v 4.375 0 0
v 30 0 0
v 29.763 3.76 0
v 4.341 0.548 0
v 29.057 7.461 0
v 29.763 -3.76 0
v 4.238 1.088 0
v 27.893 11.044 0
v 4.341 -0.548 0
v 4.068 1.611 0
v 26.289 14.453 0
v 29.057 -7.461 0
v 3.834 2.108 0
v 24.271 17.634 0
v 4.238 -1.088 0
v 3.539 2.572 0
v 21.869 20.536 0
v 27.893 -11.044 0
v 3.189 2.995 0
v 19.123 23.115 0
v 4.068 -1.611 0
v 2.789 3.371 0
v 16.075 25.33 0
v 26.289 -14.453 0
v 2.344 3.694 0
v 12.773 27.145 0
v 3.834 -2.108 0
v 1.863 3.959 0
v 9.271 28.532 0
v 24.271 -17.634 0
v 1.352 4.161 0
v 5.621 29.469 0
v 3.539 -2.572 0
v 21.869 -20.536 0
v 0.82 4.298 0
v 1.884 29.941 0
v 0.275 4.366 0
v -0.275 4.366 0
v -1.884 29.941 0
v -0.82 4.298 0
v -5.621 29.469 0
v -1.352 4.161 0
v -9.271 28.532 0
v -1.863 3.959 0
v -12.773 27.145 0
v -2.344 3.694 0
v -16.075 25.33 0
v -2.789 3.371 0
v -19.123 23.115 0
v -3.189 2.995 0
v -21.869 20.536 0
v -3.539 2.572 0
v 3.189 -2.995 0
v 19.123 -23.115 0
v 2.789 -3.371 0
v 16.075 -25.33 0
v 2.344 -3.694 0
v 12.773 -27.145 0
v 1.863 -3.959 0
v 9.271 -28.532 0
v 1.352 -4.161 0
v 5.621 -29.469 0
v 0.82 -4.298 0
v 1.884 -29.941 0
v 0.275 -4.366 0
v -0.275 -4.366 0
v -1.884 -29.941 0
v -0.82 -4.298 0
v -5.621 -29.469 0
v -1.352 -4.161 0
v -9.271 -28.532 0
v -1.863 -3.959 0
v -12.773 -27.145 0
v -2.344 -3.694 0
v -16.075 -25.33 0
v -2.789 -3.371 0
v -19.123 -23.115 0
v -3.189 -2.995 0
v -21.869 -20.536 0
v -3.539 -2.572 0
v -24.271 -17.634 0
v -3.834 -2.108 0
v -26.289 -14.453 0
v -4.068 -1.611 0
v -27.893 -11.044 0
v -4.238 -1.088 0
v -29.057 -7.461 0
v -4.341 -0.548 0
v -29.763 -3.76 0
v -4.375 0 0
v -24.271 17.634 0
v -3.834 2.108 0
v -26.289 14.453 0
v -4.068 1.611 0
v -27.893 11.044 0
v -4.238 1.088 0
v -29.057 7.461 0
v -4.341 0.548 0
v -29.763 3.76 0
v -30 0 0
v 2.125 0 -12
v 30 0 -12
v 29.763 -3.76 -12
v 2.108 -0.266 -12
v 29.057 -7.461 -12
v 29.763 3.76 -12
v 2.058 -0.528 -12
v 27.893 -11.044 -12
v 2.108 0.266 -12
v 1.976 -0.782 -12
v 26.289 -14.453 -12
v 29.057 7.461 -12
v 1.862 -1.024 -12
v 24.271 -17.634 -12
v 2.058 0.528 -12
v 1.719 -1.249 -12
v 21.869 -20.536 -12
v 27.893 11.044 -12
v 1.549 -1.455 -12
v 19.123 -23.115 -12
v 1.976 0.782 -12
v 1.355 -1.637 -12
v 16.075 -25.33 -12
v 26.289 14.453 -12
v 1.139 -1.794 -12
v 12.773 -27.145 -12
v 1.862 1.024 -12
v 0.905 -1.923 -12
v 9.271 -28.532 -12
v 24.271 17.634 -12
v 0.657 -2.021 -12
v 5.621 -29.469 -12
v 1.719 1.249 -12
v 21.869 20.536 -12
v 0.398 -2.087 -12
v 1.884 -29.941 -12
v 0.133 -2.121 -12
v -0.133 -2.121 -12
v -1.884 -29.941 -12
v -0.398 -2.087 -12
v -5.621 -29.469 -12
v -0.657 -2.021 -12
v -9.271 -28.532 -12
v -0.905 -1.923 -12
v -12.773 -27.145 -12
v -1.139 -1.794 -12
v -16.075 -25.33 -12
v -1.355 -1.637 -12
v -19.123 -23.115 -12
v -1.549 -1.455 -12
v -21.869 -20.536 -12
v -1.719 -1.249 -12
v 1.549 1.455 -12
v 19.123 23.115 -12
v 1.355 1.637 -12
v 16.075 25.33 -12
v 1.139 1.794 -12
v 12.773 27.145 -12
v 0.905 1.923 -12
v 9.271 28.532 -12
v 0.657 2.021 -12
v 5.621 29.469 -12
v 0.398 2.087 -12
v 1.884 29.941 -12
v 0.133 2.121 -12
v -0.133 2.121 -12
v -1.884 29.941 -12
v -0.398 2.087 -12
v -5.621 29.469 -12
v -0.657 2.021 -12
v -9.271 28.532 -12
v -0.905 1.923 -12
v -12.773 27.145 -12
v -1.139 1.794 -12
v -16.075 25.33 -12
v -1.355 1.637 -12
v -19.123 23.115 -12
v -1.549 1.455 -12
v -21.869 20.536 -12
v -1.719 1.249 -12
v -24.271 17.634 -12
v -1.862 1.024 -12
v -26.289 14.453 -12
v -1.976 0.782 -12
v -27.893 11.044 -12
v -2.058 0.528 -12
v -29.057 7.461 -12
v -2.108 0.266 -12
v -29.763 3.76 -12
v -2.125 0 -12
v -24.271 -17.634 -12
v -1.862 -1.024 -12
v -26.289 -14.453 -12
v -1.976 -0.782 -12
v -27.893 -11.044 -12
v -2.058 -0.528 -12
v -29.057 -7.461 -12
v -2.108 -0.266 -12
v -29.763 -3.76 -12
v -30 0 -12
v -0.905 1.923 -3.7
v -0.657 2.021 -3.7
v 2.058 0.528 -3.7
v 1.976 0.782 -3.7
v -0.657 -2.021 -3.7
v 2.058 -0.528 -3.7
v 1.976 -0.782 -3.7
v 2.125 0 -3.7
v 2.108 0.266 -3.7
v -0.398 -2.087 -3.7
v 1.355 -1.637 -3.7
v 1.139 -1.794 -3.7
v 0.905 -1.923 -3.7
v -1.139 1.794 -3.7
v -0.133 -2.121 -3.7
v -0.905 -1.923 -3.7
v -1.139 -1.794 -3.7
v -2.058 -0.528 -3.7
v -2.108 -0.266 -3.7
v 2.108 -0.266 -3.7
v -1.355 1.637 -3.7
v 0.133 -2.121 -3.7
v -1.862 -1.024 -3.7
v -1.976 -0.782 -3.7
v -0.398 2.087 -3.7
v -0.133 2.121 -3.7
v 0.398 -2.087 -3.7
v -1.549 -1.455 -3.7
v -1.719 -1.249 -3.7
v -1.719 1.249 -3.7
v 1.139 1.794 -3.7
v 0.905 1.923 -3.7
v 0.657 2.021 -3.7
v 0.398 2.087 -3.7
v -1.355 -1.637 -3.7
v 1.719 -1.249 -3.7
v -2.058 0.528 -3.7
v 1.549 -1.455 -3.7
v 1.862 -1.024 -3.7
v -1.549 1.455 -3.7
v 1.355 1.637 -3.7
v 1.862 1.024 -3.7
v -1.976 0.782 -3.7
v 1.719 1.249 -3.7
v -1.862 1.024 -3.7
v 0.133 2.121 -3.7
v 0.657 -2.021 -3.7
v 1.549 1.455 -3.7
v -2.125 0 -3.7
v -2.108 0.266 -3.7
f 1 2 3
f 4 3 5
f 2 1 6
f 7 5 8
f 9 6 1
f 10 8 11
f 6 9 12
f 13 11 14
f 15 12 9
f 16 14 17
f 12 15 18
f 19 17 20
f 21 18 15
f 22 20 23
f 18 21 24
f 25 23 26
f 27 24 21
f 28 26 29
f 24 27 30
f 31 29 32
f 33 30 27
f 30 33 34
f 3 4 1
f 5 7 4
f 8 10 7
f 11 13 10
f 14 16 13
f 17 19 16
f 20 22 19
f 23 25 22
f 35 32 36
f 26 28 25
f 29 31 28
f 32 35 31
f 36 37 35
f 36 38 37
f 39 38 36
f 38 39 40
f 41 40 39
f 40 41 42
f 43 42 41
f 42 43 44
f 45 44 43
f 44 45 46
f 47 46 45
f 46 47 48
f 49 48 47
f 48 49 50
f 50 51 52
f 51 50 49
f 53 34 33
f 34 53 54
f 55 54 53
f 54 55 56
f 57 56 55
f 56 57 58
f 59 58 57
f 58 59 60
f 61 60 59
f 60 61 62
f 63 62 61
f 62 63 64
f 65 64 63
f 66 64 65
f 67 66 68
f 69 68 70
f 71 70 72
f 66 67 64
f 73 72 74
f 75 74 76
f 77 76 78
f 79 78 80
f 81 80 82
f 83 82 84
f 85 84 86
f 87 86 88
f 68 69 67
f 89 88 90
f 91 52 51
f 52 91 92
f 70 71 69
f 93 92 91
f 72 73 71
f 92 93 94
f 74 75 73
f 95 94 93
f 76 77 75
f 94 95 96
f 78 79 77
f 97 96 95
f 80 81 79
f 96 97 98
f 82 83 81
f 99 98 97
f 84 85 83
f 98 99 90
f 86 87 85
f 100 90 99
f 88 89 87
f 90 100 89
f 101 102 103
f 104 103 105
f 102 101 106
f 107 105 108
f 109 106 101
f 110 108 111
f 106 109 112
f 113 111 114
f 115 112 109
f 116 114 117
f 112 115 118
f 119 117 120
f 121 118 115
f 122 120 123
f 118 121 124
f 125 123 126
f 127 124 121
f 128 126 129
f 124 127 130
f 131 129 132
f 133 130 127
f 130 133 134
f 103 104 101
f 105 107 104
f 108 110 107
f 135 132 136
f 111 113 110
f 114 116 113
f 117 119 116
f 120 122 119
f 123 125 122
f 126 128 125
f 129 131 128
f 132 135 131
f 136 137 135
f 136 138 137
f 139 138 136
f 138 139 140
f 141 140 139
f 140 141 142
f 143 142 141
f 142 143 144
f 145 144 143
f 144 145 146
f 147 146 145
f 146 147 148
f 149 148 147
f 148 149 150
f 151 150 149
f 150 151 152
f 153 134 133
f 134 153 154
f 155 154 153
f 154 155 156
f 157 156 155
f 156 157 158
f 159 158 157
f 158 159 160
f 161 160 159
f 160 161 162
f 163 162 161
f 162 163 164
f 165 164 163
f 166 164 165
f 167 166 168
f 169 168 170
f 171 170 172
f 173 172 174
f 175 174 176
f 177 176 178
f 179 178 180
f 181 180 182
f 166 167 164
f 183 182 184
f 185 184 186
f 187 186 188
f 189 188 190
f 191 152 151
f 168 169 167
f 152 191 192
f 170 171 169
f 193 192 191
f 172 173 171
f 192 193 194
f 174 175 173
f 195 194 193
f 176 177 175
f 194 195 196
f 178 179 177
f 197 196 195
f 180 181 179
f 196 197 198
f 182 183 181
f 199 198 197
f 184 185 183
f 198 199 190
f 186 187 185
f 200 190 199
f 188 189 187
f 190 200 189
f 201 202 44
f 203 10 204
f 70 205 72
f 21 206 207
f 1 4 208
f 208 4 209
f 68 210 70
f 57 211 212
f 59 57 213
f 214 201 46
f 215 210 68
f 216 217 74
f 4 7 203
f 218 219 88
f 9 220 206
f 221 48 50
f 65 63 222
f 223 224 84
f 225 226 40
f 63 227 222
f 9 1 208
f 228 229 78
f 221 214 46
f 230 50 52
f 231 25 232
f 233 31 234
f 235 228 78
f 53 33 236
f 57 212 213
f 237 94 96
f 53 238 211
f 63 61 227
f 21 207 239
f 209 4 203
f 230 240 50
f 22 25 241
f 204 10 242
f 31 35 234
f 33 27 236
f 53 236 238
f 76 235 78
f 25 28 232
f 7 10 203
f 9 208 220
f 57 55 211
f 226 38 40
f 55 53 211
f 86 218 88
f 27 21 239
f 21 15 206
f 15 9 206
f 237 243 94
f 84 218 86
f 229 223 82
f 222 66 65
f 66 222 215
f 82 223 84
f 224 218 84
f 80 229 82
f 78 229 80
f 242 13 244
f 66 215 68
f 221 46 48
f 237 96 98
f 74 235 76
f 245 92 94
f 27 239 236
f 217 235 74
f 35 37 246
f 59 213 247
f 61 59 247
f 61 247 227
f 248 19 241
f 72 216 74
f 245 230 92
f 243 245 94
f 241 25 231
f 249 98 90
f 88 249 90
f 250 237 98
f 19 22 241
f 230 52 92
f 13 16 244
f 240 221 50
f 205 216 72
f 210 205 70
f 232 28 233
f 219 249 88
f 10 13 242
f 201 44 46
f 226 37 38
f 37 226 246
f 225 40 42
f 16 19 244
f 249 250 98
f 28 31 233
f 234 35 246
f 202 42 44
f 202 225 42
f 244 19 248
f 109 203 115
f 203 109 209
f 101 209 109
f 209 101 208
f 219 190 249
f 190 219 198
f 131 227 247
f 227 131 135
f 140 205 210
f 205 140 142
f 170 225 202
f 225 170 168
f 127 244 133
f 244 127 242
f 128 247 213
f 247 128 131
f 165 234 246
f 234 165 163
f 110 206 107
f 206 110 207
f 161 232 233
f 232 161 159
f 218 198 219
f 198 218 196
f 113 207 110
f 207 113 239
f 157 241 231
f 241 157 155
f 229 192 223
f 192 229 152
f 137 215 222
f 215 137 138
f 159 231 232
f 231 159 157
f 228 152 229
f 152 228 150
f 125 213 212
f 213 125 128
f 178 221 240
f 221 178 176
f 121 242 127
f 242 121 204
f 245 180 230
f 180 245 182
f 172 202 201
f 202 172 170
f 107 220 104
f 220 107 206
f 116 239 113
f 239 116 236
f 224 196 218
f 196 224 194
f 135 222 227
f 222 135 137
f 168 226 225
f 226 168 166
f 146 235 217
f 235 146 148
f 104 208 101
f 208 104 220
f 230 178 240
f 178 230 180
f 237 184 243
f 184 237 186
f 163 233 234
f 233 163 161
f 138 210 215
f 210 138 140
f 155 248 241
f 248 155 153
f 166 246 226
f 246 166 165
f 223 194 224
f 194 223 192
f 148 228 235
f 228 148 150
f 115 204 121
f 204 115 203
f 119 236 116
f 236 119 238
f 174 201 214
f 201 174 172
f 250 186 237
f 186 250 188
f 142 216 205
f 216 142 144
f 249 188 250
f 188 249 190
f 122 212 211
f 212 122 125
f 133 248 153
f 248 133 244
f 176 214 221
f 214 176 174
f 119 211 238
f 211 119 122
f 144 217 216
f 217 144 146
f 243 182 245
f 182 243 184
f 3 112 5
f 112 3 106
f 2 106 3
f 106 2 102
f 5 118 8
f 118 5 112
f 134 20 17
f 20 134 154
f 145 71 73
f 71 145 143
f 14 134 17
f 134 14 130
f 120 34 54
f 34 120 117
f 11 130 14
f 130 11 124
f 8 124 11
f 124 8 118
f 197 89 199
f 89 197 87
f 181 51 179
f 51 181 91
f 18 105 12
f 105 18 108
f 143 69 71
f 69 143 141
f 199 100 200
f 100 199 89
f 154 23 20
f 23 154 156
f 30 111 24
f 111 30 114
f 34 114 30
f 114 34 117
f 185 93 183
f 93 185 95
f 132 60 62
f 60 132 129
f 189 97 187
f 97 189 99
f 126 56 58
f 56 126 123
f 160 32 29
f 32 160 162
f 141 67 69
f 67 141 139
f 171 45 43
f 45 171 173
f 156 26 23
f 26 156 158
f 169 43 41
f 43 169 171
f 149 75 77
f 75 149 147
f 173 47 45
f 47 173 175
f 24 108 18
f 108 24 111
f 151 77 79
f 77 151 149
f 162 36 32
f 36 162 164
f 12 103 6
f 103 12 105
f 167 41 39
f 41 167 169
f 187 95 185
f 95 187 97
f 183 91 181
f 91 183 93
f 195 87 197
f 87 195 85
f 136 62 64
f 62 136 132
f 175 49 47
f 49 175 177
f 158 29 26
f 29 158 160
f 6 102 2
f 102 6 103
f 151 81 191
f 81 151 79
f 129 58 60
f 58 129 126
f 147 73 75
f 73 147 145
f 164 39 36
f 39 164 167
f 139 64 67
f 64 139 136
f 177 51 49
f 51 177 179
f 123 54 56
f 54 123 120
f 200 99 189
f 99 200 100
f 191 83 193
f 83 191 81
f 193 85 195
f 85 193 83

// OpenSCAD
$fn = 50;


difference() {
	union() {
		translate(v = [0, 0, -12.0000000000]) {
			cylinder(h = 12, r = 30.0000000000);
		}
	}
	union() {
		translate(v = [0, 0, 0]) {
			rotate(a = [0, 0, 0]) {
				difference() {
					union() {
						translate(v = [0, 0, -12.0000000000]) {
							cylinder(h = 12, r = 2.0000000000);
						}
						translate(v = [0, 0, -3.7000000000]) {
							cylinder(h = 3.7000000000, r1 = 2.1250000000, r2 = 4.3750000000);
						}
						translate(v = [0, 0, -12.0000000000]) {
							cylinder(h = 12, r = 2.1250000000);
						}
						translate(v = [0, 0, -12.0000000000]) {
							cylinder(h = 12, r = 2.0000000000);
						}
					}
					union();
				}
			}
		}
	}
}
